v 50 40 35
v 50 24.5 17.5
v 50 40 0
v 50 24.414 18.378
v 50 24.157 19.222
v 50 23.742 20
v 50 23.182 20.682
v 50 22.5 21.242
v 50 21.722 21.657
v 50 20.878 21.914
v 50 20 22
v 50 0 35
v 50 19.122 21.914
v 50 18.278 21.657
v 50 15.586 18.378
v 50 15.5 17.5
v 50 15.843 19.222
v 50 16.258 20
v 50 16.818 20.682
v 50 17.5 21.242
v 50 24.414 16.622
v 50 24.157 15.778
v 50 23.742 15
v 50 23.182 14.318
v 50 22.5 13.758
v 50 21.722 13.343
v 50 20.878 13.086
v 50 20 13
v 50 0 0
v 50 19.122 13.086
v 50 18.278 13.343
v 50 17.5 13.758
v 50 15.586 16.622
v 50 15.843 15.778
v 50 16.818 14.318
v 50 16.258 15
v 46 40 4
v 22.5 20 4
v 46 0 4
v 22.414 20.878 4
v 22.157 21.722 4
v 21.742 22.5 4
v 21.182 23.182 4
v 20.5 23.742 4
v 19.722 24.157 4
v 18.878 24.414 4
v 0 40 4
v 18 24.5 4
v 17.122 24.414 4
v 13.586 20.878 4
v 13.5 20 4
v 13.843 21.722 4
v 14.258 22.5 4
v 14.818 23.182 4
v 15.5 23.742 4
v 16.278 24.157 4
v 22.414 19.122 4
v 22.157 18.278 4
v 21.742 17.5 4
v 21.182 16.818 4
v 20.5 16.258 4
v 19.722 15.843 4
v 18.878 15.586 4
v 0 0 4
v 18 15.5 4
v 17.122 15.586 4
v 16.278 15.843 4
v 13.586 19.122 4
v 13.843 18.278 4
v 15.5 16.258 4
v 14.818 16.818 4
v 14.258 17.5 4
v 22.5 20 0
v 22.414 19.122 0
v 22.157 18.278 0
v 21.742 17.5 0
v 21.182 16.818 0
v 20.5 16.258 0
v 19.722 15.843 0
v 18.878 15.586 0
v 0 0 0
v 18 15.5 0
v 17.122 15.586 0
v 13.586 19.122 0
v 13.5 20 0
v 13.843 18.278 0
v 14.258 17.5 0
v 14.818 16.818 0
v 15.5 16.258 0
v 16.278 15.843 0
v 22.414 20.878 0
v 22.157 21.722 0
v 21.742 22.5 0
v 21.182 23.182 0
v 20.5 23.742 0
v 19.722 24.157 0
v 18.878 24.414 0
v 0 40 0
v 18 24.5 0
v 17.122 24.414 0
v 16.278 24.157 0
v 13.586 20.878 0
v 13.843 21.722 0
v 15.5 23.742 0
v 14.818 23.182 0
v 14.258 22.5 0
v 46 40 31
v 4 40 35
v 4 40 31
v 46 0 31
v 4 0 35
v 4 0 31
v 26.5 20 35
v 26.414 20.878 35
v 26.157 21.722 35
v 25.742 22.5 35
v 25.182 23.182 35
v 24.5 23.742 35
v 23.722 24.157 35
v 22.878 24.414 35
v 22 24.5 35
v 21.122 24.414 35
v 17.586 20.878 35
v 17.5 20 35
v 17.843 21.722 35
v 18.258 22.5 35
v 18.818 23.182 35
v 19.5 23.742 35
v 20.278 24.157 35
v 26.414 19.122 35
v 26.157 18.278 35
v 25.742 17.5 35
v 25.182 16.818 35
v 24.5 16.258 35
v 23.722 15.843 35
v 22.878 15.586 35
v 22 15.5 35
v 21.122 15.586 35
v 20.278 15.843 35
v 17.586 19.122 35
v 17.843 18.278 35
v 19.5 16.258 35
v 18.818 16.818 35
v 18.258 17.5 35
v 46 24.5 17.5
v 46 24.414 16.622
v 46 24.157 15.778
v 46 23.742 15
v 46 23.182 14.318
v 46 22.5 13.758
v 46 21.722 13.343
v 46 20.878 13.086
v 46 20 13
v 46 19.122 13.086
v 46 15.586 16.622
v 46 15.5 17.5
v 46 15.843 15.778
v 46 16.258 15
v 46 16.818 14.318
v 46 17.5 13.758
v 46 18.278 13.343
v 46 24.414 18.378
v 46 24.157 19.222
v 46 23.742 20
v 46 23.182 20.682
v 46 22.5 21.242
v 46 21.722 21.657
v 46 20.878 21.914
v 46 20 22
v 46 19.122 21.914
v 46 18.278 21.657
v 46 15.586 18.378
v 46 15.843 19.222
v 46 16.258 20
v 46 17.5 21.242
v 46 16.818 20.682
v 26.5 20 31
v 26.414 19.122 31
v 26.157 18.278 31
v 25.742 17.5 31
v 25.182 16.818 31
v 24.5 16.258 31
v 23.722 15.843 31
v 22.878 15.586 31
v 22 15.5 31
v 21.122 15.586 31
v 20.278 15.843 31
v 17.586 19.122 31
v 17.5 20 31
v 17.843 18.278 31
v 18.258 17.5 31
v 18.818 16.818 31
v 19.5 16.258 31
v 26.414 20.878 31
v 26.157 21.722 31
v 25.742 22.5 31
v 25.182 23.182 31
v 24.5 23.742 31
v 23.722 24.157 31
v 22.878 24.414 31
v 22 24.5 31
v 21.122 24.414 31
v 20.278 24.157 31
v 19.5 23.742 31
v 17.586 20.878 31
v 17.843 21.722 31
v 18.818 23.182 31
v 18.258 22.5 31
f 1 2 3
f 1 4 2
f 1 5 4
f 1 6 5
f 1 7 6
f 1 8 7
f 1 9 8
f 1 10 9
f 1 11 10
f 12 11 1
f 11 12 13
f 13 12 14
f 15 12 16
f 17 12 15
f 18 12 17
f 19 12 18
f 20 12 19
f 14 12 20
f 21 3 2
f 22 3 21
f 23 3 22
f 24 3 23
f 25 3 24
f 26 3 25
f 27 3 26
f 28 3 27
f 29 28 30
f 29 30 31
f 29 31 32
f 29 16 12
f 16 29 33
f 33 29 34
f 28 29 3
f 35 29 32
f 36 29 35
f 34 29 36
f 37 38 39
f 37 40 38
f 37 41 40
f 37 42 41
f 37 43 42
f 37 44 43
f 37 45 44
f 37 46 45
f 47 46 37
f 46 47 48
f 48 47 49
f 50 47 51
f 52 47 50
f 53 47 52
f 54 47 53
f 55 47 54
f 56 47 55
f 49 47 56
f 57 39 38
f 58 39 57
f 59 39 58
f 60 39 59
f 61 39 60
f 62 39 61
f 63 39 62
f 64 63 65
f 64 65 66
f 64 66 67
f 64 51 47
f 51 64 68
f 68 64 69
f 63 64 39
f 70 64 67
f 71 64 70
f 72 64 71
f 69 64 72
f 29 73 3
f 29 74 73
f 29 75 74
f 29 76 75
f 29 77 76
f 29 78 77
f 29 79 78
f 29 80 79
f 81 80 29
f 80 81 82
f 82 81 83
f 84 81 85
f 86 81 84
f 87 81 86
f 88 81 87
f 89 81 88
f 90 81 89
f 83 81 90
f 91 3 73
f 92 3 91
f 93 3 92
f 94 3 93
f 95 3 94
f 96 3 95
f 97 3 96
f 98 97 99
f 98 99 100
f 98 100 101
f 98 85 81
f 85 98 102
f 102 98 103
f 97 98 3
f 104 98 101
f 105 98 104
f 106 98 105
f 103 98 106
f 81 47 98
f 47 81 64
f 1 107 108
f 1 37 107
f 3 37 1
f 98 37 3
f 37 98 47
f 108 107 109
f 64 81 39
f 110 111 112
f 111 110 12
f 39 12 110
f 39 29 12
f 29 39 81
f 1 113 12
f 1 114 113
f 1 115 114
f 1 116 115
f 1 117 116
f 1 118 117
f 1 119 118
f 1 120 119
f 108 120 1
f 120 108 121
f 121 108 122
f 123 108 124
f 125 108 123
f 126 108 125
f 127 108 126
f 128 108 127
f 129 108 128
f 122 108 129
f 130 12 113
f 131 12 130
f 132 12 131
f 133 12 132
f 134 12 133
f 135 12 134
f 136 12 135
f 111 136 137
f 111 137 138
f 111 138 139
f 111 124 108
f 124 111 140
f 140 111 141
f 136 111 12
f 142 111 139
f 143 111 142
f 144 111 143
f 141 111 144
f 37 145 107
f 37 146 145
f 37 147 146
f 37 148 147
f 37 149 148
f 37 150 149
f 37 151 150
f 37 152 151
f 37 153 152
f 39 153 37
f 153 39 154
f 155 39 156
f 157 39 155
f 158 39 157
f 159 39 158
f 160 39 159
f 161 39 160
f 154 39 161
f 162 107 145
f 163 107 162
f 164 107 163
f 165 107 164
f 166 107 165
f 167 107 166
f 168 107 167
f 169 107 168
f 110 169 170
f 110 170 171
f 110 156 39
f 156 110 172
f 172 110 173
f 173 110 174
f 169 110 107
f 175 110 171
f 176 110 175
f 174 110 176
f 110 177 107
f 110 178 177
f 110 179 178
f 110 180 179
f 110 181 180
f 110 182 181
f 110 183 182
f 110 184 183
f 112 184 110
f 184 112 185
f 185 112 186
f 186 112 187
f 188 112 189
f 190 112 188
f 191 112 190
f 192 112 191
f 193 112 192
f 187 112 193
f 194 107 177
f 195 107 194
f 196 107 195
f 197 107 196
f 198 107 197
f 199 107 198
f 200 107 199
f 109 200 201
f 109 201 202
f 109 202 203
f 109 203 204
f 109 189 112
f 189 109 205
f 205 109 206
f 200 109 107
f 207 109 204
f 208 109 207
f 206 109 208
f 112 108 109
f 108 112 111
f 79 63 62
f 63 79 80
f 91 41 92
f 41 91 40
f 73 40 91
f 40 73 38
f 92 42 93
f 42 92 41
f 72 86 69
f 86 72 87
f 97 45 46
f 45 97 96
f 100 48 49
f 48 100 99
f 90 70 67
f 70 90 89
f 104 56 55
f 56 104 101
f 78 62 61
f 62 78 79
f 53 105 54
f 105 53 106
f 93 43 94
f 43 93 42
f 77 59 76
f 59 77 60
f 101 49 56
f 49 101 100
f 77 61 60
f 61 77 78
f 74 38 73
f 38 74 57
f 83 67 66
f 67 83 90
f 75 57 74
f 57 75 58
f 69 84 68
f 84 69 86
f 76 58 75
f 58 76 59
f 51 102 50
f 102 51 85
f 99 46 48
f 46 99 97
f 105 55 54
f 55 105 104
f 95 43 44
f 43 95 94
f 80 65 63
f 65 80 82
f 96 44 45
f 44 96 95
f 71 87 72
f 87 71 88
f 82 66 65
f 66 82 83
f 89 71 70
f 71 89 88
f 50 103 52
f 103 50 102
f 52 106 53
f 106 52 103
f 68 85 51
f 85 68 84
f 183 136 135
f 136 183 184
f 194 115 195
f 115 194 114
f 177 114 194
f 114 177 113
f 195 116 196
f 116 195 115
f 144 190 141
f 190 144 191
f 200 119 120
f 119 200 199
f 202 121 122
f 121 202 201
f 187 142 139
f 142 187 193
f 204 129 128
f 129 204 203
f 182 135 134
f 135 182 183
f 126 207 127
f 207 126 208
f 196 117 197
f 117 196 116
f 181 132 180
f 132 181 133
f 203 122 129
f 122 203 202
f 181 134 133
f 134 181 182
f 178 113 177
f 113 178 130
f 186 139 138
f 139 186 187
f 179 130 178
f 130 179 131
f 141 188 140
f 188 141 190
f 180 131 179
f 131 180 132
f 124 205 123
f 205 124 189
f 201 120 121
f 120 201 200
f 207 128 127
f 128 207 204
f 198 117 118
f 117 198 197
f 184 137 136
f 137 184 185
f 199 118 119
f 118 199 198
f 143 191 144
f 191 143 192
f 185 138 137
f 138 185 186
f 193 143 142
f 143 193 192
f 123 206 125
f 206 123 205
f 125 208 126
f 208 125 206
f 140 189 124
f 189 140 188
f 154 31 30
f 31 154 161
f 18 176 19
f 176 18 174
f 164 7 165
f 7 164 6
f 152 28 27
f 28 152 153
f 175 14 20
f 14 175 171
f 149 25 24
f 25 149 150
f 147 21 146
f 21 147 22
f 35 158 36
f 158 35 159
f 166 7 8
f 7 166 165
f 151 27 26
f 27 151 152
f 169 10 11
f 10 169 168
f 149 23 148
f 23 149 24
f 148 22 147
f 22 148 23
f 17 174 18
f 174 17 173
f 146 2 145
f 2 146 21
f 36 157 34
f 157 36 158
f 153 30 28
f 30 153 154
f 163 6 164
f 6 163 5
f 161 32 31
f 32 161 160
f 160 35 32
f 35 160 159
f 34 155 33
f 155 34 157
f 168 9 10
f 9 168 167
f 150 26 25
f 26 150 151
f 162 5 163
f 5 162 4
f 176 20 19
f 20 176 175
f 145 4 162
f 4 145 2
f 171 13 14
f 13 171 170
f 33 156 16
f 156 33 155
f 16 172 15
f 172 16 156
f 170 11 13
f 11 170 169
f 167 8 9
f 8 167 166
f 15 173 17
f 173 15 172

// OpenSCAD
$fn = 32;

// ----------------------------------------------------------------------
// Z-bracket: 50 x 40 x 35 mm
// ----------------------------------------------------------------------

// --- parameters (mm) ---
lower_leg = 50;           // lower foot length, X
upper_leg = 42;           // upper foot length, X
bracket_w = 40;           // bracket width, Y
offset_h = 35;            // overall rise, Z
sheet_t = 4;              // plate thickness
hole_d = 9;               // clearance for M8

module hole_z(px, py, z0) {
  translate([px, py, z0 - 2.5]) cylinder(h = sheet_t + 5, d = hole_d);
}
module hole_x(py, pz) {
  translate([-2.5, py, pz]) rotate([0, 90, 0]) cylinder(h = sheet_t + 5, d = hole_d);
}

difference() {
  union() {
    cube([lower_leg, bracket_w, sheet_t]);
    /* web, overlapping the lower foot */
    translate([lower_leg - sheet_t, 0, 0]) cube([sheet_t, bracket_w, offset_h]);
    /* upper foot, sunk into the web */
    translate([lower_leg - sheet_t - upper_leg, 0, offset_h - sheet_t]) cube([upper_leg + sheet_t, bracket_w, sheet_t]);
  }
  hole_z(18, 20, 0);
  translate([lower_leg - sheet_t - 24, 0, 0]) hole_z(0, 20, offset_h - sheet_t);
  translate([lower_leg - sheet_t, 0, 0]) hole_x(20, 17.5);
}
